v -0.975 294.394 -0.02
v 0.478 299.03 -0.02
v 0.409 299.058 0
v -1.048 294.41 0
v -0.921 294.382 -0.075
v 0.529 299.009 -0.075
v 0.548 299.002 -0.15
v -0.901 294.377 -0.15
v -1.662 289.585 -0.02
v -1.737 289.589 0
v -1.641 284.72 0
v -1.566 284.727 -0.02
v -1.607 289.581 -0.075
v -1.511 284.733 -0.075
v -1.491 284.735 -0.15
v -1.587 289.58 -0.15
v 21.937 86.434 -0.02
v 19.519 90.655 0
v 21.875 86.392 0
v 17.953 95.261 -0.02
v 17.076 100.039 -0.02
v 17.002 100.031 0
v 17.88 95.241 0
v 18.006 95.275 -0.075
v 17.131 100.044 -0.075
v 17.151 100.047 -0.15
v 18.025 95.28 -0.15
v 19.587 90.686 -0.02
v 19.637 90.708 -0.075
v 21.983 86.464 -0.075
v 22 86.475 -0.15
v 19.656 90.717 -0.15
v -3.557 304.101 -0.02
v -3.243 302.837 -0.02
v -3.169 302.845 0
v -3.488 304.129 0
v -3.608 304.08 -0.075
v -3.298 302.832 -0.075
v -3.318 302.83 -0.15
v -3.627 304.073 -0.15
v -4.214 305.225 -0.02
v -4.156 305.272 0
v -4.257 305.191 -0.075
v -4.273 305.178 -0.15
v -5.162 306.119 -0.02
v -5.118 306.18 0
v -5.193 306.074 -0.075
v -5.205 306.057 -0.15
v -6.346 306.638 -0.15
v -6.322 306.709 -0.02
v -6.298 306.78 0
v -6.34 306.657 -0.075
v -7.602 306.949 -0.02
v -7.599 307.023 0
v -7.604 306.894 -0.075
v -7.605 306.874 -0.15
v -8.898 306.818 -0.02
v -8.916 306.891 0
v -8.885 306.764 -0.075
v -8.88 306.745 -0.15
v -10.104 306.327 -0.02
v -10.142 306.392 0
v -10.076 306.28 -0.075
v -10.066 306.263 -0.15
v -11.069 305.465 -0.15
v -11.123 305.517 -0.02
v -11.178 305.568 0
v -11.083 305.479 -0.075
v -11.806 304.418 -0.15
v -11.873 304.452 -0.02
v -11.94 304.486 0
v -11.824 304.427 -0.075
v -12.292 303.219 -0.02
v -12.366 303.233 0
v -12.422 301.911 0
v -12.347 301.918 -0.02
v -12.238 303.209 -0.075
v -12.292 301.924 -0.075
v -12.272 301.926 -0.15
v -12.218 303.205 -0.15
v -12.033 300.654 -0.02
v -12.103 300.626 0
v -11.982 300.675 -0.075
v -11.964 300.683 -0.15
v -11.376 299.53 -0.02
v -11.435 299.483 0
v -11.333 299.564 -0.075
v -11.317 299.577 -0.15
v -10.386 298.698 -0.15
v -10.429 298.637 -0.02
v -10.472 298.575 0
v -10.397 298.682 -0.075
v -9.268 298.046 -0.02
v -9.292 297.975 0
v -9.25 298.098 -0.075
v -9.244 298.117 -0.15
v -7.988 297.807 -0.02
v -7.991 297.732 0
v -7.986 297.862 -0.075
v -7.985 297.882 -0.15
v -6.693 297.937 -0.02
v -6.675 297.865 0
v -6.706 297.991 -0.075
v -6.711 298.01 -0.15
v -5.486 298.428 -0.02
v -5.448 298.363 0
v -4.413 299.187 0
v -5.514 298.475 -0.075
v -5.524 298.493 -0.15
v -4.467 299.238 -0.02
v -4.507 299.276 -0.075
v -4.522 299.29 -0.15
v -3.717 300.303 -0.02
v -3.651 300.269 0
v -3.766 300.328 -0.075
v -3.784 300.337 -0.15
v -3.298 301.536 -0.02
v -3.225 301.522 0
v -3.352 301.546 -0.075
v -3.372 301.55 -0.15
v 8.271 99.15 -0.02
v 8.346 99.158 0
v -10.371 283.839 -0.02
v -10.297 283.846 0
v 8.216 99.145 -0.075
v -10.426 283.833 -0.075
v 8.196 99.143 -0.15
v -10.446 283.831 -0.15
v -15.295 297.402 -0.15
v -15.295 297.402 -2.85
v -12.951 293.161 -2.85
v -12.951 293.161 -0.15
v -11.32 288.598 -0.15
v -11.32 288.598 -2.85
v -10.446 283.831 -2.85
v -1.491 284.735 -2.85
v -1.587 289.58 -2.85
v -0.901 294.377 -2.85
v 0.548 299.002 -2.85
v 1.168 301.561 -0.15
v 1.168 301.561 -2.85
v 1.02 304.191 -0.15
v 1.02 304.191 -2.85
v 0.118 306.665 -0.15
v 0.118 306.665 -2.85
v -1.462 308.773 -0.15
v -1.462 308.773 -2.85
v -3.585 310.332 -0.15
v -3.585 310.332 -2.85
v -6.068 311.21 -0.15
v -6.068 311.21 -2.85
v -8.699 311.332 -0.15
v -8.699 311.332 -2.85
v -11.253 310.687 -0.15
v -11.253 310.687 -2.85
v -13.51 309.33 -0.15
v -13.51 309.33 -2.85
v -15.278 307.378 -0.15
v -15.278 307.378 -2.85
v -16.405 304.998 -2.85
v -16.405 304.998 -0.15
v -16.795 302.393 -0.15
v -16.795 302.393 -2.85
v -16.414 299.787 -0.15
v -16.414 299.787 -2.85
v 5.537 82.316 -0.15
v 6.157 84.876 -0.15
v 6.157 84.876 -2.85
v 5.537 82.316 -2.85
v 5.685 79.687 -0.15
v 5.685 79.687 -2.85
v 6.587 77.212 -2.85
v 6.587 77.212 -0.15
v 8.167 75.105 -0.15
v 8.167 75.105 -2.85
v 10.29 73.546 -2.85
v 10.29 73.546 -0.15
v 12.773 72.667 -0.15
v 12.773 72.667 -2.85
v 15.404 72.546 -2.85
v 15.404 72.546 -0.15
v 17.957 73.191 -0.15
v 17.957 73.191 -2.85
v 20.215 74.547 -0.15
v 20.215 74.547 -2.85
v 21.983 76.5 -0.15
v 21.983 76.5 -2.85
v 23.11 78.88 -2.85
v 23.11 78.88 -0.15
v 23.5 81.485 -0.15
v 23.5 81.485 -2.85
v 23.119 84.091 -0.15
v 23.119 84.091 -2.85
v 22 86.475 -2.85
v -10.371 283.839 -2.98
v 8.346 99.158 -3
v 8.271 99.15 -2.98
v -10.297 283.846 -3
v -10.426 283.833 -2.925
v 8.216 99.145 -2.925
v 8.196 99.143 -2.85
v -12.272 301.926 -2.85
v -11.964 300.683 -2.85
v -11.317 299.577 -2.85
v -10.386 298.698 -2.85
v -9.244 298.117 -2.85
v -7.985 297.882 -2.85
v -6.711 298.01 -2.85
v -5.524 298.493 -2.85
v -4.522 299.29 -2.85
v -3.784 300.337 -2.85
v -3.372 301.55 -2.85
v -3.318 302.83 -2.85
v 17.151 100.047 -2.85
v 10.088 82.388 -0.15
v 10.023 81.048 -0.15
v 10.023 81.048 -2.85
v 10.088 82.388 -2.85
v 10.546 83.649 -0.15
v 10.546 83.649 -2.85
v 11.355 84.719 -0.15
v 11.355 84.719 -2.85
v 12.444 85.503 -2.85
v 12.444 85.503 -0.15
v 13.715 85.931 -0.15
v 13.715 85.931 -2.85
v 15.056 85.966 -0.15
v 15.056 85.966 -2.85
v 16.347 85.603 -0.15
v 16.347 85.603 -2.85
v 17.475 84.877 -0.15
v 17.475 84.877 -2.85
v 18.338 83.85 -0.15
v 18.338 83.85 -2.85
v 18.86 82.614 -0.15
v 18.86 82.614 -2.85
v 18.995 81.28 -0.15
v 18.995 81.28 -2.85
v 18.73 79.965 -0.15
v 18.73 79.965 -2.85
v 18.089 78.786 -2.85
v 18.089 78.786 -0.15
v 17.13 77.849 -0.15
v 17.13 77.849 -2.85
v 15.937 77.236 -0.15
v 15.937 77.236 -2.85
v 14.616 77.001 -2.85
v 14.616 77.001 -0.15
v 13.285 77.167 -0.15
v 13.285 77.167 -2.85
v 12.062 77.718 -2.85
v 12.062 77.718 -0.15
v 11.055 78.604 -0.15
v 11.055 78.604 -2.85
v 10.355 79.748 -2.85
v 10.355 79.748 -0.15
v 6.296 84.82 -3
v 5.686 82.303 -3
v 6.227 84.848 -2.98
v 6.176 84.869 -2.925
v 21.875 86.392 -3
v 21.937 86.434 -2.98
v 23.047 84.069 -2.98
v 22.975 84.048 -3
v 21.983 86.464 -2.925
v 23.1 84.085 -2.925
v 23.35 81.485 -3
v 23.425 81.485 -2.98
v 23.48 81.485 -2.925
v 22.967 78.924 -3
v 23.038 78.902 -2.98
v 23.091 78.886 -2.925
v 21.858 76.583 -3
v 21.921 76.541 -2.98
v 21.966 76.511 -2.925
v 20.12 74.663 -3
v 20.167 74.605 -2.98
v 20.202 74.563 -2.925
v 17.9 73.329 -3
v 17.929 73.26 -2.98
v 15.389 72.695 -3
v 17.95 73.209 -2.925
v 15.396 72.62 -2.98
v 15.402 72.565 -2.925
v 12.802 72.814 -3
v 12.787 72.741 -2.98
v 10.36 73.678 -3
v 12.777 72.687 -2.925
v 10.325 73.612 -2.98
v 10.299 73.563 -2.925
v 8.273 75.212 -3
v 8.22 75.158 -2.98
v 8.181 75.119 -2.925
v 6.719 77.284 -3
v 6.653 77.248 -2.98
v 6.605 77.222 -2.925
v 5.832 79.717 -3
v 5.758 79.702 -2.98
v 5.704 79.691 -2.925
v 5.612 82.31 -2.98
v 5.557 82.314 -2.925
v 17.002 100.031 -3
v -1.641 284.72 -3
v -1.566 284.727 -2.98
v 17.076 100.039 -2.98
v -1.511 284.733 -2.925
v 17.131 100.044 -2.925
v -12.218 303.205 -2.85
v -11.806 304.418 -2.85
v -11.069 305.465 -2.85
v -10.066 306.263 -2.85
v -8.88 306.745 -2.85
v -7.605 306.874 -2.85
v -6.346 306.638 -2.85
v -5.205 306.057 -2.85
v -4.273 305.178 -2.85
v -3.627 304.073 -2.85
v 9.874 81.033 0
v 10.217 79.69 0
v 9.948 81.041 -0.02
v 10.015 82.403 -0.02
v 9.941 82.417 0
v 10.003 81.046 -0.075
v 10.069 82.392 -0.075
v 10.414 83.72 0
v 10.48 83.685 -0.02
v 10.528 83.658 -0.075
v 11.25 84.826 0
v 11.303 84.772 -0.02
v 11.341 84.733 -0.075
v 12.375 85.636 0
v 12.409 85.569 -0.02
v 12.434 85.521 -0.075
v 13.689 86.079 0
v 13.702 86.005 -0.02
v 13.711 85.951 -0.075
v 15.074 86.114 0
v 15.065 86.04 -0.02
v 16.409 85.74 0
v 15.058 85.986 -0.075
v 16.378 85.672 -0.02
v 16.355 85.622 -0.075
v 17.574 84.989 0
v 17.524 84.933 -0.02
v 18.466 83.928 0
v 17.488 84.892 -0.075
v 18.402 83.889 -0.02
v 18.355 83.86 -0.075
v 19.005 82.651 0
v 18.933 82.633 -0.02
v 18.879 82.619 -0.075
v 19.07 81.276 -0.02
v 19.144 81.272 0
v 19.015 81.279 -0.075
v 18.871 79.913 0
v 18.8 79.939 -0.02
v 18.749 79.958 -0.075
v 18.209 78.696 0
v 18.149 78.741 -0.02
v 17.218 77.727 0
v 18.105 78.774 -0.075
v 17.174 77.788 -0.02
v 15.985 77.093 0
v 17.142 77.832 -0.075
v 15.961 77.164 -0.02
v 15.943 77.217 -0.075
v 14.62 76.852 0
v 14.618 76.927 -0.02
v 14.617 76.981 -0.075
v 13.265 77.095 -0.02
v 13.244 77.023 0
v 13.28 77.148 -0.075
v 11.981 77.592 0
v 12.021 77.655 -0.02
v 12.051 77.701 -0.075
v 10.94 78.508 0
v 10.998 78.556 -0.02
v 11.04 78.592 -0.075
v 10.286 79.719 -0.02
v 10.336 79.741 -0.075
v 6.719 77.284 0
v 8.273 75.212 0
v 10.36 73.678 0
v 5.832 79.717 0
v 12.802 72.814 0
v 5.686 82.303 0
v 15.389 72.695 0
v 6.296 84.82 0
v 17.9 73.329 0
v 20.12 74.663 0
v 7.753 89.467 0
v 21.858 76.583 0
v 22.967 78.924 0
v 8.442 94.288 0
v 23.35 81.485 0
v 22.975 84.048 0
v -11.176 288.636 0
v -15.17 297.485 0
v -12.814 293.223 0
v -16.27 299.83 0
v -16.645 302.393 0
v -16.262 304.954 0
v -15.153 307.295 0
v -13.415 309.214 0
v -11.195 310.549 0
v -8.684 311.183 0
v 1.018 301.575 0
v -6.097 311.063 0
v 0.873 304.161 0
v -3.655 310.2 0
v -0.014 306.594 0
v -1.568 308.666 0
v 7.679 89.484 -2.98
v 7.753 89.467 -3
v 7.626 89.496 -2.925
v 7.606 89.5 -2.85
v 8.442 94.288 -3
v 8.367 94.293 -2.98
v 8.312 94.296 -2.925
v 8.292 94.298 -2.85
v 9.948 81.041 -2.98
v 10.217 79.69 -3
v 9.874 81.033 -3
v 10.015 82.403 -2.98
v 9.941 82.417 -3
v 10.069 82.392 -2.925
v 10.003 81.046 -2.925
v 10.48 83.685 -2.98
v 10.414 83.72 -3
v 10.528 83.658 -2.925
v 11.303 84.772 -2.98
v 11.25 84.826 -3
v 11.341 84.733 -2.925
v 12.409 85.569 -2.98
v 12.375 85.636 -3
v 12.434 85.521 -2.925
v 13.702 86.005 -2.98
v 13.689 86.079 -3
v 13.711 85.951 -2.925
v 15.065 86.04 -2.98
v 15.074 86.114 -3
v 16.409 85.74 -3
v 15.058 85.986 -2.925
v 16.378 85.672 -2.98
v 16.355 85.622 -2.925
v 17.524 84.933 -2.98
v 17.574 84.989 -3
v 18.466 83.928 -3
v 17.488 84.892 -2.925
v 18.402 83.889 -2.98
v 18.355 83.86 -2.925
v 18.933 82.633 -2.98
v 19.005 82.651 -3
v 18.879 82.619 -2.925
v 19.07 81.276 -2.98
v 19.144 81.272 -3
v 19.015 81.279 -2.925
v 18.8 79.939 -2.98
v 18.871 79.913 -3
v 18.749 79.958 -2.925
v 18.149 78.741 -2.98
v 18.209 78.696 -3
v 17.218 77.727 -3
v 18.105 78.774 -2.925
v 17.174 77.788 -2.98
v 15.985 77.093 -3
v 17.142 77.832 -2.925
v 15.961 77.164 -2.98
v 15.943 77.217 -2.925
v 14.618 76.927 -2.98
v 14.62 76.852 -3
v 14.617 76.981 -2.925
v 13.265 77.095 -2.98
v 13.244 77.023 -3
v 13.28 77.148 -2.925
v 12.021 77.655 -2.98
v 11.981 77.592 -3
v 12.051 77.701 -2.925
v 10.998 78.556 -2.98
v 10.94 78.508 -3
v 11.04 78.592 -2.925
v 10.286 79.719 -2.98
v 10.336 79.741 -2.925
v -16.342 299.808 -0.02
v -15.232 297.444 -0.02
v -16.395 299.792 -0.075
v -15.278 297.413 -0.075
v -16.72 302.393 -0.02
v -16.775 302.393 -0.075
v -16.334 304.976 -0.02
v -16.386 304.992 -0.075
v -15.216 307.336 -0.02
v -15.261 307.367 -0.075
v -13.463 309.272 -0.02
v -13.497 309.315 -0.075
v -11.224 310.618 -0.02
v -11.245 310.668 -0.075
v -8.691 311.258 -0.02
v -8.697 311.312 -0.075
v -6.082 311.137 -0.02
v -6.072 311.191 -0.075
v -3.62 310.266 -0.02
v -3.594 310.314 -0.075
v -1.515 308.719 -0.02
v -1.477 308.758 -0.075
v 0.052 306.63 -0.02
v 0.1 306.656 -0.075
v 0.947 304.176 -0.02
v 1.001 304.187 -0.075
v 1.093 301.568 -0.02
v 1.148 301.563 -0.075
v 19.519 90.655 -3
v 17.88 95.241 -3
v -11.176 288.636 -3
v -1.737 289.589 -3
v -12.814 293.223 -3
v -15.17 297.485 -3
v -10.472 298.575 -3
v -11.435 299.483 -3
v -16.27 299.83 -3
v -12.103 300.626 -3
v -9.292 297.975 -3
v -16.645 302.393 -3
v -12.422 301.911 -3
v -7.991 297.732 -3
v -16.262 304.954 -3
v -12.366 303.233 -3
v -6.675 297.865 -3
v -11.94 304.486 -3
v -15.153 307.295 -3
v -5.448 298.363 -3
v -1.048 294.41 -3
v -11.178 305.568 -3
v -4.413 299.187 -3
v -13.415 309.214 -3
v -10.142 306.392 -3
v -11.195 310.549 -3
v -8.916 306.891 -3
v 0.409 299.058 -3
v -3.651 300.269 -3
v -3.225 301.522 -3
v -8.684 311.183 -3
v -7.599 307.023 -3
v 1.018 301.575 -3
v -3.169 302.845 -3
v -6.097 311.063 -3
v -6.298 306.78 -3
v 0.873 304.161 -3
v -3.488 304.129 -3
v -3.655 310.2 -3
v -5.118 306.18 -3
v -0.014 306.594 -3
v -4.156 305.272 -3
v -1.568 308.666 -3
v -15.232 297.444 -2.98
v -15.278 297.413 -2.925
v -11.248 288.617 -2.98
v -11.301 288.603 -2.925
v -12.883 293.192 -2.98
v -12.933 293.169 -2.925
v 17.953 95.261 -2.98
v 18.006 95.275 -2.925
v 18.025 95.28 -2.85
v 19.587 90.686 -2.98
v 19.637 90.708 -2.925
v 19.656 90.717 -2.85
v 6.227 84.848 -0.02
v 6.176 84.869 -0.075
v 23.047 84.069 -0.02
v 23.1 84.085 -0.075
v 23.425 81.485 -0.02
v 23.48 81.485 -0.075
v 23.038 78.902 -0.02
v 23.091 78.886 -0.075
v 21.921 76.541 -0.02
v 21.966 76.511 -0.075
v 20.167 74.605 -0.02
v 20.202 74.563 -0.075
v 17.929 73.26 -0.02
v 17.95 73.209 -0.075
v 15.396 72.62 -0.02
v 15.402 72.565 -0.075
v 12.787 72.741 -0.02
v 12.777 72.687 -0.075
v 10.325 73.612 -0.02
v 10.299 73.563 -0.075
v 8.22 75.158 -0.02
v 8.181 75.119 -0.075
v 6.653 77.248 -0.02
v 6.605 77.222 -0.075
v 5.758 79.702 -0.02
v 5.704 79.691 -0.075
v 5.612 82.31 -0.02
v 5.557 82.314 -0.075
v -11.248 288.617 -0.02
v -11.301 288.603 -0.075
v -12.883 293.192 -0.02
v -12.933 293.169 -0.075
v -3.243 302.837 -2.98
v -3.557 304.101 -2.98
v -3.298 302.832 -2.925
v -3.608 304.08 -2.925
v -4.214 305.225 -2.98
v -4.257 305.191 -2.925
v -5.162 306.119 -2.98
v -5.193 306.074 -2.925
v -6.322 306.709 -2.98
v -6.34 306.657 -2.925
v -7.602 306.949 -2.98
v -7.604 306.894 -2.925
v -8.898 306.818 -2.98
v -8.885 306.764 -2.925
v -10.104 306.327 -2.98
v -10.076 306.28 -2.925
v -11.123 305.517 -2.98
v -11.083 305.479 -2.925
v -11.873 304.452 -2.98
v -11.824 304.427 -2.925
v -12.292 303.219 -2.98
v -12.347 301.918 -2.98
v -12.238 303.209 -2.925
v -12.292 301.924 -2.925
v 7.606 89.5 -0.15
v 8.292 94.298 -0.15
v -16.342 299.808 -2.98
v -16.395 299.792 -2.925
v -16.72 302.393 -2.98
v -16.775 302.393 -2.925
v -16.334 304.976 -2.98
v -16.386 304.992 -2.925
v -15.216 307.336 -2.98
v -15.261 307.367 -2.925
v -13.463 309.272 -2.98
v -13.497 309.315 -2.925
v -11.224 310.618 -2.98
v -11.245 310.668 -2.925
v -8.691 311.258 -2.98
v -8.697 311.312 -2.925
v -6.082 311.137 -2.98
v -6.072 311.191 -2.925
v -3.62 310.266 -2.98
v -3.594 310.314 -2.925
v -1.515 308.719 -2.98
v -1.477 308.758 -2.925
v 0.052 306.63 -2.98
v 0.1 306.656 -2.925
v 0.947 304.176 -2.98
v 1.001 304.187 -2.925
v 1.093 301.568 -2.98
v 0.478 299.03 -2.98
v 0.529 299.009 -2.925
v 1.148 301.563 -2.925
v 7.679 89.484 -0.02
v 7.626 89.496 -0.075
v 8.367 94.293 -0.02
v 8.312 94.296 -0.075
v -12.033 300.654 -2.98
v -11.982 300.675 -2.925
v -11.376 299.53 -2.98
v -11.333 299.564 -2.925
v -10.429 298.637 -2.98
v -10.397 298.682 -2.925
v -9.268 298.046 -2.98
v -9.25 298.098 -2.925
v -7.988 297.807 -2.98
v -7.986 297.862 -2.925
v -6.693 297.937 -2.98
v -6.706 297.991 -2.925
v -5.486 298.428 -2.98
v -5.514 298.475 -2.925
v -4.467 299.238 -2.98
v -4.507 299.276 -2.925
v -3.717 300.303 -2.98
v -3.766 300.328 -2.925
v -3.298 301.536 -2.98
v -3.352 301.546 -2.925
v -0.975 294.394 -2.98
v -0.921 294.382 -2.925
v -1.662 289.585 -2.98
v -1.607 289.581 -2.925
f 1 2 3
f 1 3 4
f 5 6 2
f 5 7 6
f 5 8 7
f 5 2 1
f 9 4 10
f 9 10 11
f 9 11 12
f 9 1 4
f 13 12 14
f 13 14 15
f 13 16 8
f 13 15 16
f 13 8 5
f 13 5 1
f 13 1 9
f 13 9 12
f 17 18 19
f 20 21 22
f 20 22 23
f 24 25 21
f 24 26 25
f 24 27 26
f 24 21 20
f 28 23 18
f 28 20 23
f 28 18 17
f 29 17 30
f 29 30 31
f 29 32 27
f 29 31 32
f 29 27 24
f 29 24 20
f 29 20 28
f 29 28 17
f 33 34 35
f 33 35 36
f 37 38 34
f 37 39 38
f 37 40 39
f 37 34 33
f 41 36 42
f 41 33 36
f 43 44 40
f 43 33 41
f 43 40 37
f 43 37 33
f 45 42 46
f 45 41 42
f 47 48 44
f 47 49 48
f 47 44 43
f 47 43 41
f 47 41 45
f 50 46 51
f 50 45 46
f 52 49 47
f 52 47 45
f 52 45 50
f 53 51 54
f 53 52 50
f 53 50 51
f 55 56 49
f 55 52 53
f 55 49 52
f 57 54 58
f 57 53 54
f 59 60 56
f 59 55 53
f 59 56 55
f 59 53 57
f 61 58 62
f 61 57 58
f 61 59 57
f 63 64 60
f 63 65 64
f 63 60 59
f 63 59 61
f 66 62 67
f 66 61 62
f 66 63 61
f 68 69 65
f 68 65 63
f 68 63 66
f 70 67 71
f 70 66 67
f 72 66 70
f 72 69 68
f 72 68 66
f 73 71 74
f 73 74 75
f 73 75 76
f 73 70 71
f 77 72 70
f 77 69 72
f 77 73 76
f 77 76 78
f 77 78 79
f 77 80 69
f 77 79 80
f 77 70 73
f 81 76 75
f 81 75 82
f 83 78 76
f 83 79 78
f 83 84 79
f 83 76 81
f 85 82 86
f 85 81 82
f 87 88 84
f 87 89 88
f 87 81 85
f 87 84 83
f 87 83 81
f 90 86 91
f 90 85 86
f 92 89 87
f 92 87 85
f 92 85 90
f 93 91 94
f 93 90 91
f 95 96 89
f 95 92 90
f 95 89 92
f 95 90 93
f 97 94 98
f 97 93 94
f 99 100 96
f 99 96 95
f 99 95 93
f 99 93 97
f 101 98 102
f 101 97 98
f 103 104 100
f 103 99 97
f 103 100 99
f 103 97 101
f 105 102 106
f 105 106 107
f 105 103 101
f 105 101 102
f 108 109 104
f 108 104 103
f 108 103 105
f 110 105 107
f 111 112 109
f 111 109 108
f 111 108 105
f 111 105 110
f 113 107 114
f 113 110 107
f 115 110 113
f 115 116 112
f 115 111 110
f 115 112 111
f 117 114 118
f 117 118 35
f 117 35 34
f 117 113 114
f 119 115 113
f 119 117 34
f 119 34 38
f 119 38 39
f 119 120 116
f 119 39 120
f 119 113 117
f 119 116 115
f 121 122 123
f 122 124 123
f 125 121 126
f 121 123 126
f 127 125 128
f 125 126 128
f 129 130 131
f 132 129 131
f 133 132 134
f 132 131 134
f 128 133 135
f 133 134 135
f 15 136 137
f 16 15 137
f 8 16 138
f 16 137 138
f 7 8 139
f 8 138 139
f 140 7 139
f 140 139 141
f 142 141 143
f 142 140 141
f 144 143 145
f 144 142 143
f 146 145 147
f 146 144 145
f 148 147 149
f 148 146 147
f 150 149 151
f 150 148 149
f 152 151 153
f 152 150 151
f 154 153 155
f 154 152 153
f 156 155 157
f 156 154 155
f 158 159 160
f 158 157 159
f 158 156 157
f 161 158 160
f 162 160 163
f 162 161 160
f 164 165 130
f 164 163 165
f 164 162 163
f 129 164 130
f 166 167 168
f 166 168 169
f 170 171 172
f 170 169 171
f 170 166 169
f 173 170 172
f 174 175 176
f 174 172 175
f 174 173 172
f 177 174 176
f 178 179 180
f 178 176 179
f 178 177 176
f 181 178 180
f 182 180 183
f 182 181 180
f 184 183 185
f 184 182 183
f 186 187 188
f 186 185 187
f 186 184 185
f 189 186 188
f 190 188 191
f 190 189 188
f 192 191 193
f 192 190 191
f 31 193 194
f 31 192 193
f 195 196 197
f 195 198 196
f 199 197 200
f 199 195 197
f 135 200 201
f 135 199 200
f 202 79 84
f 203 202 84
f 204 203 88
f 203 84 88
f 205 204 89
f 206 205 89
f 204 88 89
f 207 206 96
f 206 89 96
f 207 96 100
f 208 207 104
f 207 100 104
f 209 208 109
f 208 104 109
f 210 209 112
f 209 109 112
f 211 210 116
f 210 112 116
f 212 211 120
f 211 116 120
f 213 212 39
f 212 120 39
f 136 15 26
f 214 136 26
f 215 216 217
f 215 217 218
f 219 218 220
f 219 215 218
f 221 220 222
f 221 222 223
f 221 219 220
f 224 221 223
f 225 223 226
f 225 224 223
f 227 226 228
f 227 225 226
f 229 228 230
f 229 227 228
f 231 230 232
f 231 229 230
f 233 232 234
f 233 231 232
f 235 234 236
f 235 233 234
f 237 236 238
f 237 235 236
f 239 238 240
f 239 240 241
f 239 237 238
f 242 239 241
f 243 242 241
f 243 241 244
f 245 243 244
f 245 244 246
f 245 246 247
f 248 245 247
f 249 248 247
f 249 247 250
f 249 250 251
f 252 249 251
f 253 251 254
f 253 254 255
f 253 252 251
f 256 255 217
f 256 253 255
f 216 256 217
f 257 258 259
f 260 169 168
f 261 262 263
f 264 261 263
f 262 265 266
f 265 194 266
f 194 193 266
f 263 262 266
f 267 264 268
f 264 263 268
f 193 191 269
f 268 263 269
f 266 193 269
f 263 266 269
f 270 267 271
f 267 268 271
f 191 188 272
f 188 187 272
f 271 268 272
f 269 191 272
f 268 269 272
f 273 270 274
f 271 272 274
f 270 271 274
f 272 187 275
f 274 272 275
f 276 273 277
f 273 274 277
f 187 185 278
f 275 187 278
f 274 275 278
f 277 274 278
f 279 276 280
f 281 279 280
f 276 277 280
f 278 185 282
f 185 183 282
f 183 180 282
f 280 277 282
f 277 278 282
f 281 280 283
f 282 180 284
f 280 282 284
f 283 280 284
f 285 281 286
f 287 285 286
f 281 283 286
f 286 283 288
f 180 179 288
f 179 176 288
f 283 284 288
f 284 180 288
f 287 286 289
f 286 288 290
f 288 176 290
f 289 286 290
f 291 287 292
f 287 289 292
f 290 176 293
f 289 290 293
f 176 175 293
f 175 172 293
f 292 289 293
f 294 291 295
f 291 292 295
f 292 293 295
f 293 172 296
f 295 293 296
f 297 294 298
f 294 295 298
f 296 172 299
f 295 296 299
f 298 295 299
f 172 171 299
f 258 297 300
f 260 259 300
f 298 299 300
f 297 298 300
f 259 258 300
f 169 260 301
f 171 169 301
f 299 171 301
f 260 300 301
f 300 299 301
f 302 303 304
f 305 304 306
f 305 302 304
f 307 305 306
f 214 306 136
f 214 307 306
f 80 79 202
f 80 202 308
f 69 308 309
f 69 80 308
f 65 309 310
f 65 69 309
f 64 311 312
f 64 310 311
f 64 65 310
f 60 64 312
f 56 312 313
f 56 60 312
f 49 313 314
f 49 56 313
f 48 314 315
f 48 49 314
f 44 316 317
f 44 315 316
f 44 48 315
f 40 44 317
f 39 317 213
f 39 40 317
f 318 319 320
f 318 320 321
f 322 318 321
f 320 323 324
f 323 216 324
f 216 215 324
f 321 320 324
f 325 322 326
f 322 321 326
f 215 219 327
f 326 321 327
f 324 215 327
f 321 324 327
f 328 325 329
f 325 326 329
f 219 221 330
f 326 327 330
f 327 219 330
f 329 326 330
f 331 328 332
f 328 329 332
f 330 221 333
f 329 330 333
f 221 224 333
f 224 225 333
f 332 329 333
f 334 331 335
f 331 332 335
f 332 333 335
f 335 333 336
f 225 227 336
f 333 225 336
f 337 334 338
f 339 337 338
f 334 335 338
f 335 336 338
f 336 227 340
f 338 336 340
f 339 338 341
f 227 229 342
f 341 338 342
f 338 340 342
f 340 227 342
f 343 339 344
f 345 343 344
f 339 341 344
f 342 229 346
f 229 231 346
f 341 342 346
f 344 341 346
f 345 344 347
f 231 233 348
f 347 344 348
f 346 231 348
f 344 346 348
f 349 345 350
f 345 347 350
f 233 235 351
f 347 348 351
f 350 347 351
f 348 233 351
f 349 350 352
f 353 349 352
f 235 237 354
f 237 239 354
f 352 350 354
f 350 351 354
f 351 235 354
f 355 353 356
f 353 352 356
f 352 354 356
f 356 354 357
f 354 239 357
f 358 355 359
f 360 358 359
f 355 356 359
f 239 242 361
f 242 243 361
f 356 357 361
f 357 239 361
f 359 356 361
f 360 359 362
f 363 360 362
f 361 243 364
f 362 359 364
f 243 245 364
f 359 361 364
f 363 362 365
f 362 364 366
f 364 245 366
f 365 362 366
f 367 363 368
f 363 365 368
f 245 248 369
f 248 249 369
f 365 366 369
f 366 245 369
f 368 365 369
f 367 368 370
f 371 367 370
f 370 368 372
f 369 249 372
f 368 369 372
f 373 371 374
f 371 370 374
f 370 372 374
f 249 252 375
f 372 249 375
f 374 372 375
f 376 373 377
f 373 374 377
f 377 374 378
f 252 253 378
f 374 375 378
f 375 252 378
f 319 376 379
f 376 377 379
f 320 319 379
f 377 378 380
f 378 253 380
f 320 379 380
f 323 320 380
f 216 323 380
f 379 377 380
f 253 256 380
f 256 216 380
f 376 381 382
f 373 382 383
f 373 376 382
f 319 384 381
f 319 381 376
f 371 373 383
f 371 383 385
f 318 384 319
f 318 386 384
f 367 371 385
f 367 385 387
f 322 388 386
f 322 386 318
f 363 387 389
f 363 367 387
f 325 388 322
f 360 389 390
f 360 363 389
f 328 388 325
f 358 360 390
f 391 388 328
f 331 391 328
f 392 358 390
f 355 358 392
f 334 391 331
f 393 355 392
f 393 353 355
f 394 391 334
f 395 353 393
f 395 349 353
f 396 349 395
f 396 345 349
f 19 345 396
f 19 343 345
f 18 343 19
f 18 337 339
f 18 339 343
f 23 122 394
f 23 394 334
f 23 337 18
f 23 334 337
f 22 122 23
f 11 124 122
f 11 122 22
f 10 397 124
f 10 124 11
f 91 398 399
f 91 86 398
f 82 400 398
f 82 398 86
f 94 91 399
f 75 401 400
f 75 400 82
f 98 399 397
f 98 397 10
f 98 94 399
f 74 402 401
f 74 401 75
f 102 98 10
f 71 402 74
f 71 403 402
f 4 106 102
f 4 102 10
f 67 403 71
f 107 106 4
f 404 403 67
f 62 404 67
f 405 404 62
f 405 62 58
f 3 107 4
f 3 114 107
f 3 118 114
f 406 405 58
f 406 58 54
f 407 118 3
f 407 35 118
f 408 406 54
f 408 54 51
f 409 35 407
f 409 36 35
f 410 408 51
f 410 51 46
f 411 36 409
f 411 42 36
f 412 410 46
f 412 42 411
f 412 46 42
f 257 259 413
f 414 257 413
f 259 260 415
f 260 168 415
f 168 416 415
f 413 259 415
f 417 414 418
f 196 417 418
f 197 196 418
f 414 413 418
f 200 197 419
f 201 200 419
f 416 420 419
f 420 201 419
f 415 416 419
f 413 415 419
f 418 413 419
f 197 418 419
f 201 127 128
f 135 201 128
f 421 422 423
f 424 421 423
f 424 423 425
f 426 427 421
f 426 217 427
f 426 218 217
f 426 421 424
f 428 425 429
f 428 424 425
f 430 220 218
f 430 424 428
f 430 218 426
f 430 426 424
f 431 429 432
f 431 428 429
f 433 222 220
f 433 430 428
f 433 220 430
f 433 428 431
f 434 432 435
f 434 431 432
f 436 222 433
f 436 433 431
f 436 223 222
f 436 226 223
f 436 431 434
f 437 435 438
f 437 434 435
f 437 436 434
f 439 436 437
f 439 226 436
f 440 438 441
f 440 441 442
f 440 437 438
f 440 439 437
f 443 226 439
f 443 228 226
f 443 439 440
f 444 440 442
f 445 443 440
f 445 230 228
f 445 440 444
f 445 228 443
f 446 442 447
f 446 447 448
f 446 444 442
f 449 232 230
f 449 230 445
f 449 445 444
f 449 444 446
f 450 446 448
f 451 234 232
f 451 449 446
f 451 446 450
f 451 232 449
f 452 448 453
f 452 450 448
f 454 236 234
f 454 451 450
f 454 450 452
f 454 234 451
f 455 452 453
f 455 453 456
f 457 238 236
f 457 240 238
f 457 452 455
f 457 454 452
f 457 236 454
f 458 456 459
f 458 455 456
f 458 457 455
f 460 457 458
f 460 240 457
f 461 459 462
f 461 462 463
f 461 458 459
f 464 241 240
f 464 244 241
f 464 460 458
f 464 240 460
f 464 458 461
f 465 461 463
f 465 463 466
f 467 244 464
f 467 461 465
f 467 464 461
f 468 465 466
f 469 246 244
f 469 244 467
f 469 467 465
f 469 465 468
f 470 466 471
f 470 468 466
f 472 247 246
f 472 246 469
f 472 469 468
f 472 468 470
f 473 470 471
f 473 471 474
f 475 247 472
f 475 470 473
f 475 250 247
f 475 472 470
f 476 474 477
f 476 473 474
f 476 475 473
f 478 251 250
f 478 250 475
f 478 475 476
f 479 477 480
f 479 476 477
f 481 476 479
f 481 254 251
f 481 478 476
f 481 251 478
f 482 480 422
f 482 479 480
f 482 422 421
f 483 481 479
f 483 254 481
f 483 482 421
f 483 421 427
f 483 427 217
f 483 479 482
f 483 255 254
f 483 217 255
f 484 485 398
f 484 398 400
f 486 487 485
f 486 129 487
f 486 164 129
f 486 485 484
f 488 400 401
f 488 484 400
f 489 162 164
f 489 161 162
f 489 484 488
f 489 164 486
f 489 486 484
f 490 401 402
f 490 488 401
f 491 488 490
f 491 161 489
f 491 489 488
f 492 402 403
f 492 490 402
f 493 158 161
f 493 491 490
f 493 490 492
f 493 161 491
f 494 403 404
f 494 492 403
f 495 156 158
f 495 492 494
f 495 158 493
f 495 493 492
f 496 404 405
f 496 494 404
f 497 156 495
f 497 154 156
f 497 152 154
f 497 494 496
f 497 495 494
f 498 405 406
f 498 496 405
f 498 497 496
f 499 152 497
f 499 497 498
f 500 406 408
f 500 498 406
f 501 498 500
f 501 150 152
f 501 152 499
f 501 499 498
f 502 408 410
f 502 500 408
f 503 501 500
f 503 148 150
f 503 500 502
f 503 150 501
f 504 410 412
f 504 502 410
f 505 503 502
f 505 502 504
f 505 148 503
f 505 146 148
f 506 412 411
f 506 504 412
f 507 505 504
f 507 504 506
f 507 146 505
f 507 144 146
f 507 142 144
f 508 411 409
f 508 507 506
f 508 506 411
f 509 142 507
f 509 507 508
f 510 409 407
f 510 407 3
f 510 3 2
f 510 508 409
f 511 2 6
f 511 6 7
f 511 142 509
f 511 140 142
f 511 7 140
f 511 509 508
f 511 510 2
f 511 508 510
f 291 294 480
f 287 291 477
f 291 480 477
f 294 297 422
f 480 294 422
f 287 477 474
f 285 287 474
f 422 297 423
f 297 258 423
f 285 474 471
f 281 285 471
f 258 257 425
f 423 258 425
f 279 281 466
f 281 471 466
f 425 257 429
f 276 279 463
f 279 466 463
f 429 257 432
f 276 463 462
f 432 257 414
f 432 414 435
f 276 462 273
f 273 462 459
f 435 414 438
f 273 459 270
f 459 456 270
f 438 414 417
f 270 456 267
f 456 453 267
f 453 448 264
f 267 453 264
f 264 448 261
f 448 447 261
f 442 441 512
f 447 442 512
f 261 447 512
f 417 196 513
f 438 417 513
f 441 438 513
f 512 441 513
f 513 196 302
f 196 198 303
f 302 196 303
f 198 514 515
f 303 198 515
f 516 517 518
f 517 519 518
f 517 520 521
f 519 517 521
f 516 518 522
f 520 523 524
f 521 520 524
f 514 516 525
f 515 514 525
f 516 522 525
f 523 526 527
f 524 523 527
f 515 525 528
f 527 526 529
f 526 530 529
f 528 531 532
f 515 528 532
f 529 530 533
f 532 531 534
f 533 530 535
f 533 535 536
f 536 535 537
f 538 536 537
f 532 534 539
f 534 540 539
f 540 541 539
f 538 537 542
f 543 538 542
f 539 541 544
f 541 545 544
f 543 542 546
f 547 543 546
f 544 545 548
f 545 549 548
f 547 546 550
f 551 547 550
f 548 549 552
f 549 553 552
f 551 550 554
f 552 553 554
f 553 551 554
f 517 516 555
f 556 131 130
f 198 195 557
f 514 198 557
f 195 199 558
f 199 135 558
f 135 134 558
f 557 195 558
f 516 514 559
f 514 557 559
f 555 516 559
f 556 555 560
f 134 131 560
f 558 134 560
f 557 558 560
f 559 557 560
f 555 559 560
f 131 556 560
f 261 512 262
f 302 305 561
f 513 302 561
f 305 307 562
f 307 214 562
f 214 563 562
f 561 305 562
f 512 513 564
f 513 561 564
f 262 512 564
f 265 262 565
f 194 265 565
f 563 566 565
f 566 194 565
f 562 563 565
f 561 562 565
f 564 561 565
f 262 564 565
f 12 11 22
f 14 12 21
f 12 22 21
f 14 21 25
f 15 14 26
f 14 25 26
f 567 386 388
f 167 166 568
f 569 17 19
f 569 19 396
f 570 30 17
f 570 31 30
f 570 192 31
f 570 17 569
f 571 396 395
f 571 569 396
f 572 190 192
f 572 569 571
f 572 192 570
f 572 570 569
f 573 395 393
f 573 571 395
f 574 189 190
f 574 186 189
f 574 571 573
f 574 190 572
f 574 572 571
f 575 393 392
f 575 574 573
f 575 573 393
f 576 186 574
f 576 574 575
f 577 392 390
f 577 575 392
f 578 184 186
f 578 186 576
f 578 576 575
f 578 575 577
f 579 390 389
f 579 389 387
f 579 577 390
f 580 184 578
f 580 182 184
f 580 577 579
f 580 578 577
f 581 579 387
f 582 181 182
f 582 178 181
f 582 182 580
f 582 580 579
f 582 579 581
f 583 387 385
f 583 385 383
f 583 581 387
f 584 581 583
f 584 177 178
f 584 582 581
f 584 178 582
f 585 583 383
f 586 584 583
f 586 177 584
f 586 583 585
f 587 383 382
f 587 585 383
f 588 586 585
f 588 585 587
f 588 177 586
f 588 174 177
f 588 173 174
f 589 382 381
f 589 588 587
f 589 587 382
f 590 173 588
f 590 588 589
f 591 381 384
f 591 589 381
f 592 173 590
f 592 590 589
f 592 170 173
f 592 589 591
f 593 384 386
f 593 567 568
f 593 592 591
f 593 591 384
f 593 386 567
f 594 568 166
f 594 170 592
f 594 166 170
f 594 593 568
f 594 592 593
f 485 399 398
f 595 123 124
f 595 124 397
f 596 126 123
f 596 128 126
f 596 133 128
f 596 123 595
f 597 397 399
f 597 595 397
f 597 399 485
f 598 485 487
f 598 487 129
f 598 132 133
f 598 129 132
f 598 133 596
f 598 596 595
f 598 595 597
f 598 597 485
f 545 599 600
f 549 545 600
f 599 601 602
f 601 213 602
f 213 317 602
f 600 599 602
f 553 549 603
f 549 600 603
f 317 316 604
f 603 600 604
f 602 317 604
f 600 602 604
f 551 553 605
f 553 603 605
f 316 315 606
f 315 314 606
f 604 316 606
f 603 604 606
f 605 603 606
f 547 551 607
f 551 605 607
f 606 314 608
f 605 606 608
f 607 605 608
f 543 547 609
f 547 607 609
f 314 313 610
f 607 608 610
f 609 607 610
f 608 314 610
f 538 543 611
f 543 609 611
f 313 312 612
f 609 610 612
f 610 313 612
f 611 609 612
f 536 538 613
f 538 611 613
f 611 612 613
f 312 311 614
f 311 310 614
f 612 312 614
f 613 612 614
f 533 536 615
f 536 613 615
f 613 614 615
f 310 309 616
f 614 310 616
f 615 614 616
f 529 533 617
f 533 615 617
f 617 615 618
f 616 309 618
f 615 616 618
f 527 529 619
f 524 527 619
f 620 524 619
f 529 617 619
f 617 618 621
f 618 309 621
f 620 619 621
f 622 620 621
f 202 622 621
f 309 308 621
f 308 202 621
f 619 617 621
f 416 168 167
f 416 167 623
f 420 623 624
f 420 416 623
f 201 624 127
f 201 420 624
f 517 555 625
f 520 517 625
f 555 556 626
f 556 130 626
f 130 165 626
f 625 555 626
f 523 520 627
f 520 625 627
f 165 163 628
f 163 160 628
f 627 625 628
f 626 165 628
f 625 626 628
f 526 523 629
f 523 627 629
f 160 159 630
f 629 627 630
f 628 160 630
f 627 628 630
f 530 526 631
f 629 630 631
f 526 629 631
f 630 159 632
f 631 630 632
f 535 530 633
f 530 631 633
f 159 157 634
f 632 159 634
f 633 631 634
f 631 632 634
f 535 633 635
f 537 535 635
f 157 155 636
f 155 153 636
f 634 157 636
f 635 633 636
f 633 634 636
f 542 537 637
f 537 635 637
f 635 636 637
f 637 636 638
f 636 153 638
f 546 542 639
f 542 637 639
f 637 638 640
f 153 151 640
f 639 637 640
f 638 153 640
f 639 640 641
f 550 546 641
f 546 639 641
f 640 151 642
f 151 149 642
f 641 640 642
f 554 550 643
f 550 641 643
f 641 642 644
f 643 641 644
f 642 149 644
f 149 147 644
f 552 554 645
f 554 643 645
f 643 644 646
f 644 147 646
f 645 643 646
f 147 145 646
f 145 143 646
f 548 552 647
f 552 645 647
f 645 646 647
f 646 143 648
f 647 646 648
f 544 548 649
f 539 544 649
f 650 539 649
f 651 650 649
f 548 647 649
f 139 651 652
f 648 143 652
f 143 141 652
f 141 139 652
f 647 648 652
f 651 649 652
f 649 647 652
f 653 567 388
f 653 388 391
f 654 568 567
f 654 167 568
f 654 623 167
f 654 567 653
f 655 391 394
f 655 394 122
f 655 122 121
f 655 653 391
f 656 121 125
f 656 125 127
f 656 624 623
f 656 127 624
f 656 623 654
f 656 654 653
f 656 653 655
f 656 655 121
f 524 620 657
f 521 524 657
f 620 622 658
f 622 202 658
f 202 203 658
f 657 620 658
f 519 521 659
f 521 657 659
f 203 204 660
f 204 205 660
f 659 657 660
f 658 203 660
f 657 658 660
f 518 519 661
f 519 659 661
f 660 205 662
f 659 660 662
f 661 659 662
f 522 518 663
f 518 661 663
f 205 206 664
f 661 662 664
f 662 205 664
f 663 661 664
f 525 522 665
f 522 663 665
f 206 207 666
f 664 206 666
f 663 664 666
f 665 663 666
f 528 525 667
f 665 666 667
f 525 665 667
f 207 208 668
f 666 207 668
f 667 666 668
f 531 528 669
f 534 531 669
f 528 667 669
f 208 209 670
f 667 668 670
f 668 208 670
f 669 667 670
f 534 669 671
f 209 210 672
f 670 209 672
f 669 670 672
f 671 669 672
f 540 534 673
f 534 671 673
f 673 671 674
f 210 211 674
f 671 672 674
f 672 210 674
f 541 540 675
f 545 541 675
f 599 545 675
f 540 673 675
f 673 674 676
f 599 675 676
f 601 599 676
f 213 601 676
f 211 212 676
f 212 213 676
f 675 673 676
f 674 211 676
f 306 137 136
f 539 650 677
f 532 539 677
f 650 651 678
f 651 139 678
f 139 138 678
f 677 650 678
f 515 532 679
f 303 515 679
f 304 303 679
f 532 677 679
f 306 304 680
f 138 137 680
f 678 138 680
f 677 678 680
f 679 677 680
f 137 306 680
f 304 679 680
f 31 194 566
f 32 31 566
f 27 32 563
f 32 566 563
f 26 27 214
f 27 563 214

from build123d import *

# Parameters (mm, degrees)
BOSS_EXTRUDE1_DEPTH = 3
FILLET1_R           = 30
FILLET2_R           = 0.15


with BuildPart() as part:
    # Sketch1 → Boss-Extrude1 (new body)
    with BuildSketch(Plane.XY):
        with BuildLine():
            ThreePointArc((9.239986784, 88.802894013), (15.403858063, 72.545501655), (18.194485129, 89.706752076))
            Line((18.194485129, 89.706752076), (18.977249172, 81.951929031))
            ThreePointArc((18.977249172, 81.951929031), (14.951929031, 77.022750828), (10.022750828, 81.048070969))
            Line((10.022750828, 81.048070969), (9.239986784, 88.802894013))
        make_face()
        with BuildLine():
            Line((-3.317916372, 302.829554864), (18.977249172, 81.951929031))
            ThreePointArc((18.977249172, 81.951929031), (14.048070969, 85.977249172), (10.022750828, 81.048070969))
            Line((10.022750828, 81.048070969), (-12.272414716, 301.925696801))
            ThreePointArc((-12.272414716, 301.925696801), (-7.343236513, 297.90037666), (-3.317916372, 302.829554864))
        make_face()
        with BuildLine():
            ThreePointArc((-12.272414716, 301.925696801), (-8.247094575, 306.854875005), (-3.317916372, 302.829554864))
            Line((-3.317916372, 302.829554864), (-2.535152328, 295.074731819))
            ThreePointArc((-2.535152328, 295.074731819), (-8.699023607, 311.332124177), (-11.489650673, 294.170873757))
            Line((-11.489650673, 294.170873757), (-12.272414716, 301.925696801))
        make_face()
    extrude(amount=-BOSS_EXTRUDE1_DEPTH)

    # Fillet1
    fillet1_edges = [part.edges().sort_by_distance(p)[0] for p in [
        (18.194485129, 89.706752076, -1.5),
        (9.239986784, 88.802894013, -1.5),
        (-11.489650673, 294.170873757, -1.5),
        (-2.535152328, 295.074731819, -1.5),
    ]]
    fillet(fillet1_edges, radius=FILLET1_R)

    # Fillet2
    fillet2_edges = [part.edges().sort_by_distance(p)[0] for p in [
        (-1.124831944, 191.486883885, 0),
        (-1.124831944, 191.486883885, -3),
        (15.403858063, 72.545501655, 0),
        (15.403858063, 72.545501655, -3),
        (10.022750828, 81.048070969, -3),
        (7.8296664, 192.390741948, 0),
        (7.8296664, 192.390741948, -3),
        (-8.699023607, 311.332124177, 0),
        (-8.699023607, 311.332124177, -3),
        (8.04616746, 91.885121184, 0),
        (8.04616746, 91.885121184, -3),
        (18.748264899, 92.965380142, 0),
        (18.748264899, 92.965380142, -3),
        (-7.343236513, 297.90037666, -3),
        (-12.043430442, 290.91224569, 0),
        (-12.043430442, 290.91224569, -3),
        (-1.341333004, 291.992504649, 0),
        (-1.341333004, 291.992504649, -3),
        (-7.343236513, 297.90037666, 0),
        (10.022750828, 81.048070969, 0),
    ]]
    fillet(fillet2_edges, radius=FILLET2_R)


solid = part.part
